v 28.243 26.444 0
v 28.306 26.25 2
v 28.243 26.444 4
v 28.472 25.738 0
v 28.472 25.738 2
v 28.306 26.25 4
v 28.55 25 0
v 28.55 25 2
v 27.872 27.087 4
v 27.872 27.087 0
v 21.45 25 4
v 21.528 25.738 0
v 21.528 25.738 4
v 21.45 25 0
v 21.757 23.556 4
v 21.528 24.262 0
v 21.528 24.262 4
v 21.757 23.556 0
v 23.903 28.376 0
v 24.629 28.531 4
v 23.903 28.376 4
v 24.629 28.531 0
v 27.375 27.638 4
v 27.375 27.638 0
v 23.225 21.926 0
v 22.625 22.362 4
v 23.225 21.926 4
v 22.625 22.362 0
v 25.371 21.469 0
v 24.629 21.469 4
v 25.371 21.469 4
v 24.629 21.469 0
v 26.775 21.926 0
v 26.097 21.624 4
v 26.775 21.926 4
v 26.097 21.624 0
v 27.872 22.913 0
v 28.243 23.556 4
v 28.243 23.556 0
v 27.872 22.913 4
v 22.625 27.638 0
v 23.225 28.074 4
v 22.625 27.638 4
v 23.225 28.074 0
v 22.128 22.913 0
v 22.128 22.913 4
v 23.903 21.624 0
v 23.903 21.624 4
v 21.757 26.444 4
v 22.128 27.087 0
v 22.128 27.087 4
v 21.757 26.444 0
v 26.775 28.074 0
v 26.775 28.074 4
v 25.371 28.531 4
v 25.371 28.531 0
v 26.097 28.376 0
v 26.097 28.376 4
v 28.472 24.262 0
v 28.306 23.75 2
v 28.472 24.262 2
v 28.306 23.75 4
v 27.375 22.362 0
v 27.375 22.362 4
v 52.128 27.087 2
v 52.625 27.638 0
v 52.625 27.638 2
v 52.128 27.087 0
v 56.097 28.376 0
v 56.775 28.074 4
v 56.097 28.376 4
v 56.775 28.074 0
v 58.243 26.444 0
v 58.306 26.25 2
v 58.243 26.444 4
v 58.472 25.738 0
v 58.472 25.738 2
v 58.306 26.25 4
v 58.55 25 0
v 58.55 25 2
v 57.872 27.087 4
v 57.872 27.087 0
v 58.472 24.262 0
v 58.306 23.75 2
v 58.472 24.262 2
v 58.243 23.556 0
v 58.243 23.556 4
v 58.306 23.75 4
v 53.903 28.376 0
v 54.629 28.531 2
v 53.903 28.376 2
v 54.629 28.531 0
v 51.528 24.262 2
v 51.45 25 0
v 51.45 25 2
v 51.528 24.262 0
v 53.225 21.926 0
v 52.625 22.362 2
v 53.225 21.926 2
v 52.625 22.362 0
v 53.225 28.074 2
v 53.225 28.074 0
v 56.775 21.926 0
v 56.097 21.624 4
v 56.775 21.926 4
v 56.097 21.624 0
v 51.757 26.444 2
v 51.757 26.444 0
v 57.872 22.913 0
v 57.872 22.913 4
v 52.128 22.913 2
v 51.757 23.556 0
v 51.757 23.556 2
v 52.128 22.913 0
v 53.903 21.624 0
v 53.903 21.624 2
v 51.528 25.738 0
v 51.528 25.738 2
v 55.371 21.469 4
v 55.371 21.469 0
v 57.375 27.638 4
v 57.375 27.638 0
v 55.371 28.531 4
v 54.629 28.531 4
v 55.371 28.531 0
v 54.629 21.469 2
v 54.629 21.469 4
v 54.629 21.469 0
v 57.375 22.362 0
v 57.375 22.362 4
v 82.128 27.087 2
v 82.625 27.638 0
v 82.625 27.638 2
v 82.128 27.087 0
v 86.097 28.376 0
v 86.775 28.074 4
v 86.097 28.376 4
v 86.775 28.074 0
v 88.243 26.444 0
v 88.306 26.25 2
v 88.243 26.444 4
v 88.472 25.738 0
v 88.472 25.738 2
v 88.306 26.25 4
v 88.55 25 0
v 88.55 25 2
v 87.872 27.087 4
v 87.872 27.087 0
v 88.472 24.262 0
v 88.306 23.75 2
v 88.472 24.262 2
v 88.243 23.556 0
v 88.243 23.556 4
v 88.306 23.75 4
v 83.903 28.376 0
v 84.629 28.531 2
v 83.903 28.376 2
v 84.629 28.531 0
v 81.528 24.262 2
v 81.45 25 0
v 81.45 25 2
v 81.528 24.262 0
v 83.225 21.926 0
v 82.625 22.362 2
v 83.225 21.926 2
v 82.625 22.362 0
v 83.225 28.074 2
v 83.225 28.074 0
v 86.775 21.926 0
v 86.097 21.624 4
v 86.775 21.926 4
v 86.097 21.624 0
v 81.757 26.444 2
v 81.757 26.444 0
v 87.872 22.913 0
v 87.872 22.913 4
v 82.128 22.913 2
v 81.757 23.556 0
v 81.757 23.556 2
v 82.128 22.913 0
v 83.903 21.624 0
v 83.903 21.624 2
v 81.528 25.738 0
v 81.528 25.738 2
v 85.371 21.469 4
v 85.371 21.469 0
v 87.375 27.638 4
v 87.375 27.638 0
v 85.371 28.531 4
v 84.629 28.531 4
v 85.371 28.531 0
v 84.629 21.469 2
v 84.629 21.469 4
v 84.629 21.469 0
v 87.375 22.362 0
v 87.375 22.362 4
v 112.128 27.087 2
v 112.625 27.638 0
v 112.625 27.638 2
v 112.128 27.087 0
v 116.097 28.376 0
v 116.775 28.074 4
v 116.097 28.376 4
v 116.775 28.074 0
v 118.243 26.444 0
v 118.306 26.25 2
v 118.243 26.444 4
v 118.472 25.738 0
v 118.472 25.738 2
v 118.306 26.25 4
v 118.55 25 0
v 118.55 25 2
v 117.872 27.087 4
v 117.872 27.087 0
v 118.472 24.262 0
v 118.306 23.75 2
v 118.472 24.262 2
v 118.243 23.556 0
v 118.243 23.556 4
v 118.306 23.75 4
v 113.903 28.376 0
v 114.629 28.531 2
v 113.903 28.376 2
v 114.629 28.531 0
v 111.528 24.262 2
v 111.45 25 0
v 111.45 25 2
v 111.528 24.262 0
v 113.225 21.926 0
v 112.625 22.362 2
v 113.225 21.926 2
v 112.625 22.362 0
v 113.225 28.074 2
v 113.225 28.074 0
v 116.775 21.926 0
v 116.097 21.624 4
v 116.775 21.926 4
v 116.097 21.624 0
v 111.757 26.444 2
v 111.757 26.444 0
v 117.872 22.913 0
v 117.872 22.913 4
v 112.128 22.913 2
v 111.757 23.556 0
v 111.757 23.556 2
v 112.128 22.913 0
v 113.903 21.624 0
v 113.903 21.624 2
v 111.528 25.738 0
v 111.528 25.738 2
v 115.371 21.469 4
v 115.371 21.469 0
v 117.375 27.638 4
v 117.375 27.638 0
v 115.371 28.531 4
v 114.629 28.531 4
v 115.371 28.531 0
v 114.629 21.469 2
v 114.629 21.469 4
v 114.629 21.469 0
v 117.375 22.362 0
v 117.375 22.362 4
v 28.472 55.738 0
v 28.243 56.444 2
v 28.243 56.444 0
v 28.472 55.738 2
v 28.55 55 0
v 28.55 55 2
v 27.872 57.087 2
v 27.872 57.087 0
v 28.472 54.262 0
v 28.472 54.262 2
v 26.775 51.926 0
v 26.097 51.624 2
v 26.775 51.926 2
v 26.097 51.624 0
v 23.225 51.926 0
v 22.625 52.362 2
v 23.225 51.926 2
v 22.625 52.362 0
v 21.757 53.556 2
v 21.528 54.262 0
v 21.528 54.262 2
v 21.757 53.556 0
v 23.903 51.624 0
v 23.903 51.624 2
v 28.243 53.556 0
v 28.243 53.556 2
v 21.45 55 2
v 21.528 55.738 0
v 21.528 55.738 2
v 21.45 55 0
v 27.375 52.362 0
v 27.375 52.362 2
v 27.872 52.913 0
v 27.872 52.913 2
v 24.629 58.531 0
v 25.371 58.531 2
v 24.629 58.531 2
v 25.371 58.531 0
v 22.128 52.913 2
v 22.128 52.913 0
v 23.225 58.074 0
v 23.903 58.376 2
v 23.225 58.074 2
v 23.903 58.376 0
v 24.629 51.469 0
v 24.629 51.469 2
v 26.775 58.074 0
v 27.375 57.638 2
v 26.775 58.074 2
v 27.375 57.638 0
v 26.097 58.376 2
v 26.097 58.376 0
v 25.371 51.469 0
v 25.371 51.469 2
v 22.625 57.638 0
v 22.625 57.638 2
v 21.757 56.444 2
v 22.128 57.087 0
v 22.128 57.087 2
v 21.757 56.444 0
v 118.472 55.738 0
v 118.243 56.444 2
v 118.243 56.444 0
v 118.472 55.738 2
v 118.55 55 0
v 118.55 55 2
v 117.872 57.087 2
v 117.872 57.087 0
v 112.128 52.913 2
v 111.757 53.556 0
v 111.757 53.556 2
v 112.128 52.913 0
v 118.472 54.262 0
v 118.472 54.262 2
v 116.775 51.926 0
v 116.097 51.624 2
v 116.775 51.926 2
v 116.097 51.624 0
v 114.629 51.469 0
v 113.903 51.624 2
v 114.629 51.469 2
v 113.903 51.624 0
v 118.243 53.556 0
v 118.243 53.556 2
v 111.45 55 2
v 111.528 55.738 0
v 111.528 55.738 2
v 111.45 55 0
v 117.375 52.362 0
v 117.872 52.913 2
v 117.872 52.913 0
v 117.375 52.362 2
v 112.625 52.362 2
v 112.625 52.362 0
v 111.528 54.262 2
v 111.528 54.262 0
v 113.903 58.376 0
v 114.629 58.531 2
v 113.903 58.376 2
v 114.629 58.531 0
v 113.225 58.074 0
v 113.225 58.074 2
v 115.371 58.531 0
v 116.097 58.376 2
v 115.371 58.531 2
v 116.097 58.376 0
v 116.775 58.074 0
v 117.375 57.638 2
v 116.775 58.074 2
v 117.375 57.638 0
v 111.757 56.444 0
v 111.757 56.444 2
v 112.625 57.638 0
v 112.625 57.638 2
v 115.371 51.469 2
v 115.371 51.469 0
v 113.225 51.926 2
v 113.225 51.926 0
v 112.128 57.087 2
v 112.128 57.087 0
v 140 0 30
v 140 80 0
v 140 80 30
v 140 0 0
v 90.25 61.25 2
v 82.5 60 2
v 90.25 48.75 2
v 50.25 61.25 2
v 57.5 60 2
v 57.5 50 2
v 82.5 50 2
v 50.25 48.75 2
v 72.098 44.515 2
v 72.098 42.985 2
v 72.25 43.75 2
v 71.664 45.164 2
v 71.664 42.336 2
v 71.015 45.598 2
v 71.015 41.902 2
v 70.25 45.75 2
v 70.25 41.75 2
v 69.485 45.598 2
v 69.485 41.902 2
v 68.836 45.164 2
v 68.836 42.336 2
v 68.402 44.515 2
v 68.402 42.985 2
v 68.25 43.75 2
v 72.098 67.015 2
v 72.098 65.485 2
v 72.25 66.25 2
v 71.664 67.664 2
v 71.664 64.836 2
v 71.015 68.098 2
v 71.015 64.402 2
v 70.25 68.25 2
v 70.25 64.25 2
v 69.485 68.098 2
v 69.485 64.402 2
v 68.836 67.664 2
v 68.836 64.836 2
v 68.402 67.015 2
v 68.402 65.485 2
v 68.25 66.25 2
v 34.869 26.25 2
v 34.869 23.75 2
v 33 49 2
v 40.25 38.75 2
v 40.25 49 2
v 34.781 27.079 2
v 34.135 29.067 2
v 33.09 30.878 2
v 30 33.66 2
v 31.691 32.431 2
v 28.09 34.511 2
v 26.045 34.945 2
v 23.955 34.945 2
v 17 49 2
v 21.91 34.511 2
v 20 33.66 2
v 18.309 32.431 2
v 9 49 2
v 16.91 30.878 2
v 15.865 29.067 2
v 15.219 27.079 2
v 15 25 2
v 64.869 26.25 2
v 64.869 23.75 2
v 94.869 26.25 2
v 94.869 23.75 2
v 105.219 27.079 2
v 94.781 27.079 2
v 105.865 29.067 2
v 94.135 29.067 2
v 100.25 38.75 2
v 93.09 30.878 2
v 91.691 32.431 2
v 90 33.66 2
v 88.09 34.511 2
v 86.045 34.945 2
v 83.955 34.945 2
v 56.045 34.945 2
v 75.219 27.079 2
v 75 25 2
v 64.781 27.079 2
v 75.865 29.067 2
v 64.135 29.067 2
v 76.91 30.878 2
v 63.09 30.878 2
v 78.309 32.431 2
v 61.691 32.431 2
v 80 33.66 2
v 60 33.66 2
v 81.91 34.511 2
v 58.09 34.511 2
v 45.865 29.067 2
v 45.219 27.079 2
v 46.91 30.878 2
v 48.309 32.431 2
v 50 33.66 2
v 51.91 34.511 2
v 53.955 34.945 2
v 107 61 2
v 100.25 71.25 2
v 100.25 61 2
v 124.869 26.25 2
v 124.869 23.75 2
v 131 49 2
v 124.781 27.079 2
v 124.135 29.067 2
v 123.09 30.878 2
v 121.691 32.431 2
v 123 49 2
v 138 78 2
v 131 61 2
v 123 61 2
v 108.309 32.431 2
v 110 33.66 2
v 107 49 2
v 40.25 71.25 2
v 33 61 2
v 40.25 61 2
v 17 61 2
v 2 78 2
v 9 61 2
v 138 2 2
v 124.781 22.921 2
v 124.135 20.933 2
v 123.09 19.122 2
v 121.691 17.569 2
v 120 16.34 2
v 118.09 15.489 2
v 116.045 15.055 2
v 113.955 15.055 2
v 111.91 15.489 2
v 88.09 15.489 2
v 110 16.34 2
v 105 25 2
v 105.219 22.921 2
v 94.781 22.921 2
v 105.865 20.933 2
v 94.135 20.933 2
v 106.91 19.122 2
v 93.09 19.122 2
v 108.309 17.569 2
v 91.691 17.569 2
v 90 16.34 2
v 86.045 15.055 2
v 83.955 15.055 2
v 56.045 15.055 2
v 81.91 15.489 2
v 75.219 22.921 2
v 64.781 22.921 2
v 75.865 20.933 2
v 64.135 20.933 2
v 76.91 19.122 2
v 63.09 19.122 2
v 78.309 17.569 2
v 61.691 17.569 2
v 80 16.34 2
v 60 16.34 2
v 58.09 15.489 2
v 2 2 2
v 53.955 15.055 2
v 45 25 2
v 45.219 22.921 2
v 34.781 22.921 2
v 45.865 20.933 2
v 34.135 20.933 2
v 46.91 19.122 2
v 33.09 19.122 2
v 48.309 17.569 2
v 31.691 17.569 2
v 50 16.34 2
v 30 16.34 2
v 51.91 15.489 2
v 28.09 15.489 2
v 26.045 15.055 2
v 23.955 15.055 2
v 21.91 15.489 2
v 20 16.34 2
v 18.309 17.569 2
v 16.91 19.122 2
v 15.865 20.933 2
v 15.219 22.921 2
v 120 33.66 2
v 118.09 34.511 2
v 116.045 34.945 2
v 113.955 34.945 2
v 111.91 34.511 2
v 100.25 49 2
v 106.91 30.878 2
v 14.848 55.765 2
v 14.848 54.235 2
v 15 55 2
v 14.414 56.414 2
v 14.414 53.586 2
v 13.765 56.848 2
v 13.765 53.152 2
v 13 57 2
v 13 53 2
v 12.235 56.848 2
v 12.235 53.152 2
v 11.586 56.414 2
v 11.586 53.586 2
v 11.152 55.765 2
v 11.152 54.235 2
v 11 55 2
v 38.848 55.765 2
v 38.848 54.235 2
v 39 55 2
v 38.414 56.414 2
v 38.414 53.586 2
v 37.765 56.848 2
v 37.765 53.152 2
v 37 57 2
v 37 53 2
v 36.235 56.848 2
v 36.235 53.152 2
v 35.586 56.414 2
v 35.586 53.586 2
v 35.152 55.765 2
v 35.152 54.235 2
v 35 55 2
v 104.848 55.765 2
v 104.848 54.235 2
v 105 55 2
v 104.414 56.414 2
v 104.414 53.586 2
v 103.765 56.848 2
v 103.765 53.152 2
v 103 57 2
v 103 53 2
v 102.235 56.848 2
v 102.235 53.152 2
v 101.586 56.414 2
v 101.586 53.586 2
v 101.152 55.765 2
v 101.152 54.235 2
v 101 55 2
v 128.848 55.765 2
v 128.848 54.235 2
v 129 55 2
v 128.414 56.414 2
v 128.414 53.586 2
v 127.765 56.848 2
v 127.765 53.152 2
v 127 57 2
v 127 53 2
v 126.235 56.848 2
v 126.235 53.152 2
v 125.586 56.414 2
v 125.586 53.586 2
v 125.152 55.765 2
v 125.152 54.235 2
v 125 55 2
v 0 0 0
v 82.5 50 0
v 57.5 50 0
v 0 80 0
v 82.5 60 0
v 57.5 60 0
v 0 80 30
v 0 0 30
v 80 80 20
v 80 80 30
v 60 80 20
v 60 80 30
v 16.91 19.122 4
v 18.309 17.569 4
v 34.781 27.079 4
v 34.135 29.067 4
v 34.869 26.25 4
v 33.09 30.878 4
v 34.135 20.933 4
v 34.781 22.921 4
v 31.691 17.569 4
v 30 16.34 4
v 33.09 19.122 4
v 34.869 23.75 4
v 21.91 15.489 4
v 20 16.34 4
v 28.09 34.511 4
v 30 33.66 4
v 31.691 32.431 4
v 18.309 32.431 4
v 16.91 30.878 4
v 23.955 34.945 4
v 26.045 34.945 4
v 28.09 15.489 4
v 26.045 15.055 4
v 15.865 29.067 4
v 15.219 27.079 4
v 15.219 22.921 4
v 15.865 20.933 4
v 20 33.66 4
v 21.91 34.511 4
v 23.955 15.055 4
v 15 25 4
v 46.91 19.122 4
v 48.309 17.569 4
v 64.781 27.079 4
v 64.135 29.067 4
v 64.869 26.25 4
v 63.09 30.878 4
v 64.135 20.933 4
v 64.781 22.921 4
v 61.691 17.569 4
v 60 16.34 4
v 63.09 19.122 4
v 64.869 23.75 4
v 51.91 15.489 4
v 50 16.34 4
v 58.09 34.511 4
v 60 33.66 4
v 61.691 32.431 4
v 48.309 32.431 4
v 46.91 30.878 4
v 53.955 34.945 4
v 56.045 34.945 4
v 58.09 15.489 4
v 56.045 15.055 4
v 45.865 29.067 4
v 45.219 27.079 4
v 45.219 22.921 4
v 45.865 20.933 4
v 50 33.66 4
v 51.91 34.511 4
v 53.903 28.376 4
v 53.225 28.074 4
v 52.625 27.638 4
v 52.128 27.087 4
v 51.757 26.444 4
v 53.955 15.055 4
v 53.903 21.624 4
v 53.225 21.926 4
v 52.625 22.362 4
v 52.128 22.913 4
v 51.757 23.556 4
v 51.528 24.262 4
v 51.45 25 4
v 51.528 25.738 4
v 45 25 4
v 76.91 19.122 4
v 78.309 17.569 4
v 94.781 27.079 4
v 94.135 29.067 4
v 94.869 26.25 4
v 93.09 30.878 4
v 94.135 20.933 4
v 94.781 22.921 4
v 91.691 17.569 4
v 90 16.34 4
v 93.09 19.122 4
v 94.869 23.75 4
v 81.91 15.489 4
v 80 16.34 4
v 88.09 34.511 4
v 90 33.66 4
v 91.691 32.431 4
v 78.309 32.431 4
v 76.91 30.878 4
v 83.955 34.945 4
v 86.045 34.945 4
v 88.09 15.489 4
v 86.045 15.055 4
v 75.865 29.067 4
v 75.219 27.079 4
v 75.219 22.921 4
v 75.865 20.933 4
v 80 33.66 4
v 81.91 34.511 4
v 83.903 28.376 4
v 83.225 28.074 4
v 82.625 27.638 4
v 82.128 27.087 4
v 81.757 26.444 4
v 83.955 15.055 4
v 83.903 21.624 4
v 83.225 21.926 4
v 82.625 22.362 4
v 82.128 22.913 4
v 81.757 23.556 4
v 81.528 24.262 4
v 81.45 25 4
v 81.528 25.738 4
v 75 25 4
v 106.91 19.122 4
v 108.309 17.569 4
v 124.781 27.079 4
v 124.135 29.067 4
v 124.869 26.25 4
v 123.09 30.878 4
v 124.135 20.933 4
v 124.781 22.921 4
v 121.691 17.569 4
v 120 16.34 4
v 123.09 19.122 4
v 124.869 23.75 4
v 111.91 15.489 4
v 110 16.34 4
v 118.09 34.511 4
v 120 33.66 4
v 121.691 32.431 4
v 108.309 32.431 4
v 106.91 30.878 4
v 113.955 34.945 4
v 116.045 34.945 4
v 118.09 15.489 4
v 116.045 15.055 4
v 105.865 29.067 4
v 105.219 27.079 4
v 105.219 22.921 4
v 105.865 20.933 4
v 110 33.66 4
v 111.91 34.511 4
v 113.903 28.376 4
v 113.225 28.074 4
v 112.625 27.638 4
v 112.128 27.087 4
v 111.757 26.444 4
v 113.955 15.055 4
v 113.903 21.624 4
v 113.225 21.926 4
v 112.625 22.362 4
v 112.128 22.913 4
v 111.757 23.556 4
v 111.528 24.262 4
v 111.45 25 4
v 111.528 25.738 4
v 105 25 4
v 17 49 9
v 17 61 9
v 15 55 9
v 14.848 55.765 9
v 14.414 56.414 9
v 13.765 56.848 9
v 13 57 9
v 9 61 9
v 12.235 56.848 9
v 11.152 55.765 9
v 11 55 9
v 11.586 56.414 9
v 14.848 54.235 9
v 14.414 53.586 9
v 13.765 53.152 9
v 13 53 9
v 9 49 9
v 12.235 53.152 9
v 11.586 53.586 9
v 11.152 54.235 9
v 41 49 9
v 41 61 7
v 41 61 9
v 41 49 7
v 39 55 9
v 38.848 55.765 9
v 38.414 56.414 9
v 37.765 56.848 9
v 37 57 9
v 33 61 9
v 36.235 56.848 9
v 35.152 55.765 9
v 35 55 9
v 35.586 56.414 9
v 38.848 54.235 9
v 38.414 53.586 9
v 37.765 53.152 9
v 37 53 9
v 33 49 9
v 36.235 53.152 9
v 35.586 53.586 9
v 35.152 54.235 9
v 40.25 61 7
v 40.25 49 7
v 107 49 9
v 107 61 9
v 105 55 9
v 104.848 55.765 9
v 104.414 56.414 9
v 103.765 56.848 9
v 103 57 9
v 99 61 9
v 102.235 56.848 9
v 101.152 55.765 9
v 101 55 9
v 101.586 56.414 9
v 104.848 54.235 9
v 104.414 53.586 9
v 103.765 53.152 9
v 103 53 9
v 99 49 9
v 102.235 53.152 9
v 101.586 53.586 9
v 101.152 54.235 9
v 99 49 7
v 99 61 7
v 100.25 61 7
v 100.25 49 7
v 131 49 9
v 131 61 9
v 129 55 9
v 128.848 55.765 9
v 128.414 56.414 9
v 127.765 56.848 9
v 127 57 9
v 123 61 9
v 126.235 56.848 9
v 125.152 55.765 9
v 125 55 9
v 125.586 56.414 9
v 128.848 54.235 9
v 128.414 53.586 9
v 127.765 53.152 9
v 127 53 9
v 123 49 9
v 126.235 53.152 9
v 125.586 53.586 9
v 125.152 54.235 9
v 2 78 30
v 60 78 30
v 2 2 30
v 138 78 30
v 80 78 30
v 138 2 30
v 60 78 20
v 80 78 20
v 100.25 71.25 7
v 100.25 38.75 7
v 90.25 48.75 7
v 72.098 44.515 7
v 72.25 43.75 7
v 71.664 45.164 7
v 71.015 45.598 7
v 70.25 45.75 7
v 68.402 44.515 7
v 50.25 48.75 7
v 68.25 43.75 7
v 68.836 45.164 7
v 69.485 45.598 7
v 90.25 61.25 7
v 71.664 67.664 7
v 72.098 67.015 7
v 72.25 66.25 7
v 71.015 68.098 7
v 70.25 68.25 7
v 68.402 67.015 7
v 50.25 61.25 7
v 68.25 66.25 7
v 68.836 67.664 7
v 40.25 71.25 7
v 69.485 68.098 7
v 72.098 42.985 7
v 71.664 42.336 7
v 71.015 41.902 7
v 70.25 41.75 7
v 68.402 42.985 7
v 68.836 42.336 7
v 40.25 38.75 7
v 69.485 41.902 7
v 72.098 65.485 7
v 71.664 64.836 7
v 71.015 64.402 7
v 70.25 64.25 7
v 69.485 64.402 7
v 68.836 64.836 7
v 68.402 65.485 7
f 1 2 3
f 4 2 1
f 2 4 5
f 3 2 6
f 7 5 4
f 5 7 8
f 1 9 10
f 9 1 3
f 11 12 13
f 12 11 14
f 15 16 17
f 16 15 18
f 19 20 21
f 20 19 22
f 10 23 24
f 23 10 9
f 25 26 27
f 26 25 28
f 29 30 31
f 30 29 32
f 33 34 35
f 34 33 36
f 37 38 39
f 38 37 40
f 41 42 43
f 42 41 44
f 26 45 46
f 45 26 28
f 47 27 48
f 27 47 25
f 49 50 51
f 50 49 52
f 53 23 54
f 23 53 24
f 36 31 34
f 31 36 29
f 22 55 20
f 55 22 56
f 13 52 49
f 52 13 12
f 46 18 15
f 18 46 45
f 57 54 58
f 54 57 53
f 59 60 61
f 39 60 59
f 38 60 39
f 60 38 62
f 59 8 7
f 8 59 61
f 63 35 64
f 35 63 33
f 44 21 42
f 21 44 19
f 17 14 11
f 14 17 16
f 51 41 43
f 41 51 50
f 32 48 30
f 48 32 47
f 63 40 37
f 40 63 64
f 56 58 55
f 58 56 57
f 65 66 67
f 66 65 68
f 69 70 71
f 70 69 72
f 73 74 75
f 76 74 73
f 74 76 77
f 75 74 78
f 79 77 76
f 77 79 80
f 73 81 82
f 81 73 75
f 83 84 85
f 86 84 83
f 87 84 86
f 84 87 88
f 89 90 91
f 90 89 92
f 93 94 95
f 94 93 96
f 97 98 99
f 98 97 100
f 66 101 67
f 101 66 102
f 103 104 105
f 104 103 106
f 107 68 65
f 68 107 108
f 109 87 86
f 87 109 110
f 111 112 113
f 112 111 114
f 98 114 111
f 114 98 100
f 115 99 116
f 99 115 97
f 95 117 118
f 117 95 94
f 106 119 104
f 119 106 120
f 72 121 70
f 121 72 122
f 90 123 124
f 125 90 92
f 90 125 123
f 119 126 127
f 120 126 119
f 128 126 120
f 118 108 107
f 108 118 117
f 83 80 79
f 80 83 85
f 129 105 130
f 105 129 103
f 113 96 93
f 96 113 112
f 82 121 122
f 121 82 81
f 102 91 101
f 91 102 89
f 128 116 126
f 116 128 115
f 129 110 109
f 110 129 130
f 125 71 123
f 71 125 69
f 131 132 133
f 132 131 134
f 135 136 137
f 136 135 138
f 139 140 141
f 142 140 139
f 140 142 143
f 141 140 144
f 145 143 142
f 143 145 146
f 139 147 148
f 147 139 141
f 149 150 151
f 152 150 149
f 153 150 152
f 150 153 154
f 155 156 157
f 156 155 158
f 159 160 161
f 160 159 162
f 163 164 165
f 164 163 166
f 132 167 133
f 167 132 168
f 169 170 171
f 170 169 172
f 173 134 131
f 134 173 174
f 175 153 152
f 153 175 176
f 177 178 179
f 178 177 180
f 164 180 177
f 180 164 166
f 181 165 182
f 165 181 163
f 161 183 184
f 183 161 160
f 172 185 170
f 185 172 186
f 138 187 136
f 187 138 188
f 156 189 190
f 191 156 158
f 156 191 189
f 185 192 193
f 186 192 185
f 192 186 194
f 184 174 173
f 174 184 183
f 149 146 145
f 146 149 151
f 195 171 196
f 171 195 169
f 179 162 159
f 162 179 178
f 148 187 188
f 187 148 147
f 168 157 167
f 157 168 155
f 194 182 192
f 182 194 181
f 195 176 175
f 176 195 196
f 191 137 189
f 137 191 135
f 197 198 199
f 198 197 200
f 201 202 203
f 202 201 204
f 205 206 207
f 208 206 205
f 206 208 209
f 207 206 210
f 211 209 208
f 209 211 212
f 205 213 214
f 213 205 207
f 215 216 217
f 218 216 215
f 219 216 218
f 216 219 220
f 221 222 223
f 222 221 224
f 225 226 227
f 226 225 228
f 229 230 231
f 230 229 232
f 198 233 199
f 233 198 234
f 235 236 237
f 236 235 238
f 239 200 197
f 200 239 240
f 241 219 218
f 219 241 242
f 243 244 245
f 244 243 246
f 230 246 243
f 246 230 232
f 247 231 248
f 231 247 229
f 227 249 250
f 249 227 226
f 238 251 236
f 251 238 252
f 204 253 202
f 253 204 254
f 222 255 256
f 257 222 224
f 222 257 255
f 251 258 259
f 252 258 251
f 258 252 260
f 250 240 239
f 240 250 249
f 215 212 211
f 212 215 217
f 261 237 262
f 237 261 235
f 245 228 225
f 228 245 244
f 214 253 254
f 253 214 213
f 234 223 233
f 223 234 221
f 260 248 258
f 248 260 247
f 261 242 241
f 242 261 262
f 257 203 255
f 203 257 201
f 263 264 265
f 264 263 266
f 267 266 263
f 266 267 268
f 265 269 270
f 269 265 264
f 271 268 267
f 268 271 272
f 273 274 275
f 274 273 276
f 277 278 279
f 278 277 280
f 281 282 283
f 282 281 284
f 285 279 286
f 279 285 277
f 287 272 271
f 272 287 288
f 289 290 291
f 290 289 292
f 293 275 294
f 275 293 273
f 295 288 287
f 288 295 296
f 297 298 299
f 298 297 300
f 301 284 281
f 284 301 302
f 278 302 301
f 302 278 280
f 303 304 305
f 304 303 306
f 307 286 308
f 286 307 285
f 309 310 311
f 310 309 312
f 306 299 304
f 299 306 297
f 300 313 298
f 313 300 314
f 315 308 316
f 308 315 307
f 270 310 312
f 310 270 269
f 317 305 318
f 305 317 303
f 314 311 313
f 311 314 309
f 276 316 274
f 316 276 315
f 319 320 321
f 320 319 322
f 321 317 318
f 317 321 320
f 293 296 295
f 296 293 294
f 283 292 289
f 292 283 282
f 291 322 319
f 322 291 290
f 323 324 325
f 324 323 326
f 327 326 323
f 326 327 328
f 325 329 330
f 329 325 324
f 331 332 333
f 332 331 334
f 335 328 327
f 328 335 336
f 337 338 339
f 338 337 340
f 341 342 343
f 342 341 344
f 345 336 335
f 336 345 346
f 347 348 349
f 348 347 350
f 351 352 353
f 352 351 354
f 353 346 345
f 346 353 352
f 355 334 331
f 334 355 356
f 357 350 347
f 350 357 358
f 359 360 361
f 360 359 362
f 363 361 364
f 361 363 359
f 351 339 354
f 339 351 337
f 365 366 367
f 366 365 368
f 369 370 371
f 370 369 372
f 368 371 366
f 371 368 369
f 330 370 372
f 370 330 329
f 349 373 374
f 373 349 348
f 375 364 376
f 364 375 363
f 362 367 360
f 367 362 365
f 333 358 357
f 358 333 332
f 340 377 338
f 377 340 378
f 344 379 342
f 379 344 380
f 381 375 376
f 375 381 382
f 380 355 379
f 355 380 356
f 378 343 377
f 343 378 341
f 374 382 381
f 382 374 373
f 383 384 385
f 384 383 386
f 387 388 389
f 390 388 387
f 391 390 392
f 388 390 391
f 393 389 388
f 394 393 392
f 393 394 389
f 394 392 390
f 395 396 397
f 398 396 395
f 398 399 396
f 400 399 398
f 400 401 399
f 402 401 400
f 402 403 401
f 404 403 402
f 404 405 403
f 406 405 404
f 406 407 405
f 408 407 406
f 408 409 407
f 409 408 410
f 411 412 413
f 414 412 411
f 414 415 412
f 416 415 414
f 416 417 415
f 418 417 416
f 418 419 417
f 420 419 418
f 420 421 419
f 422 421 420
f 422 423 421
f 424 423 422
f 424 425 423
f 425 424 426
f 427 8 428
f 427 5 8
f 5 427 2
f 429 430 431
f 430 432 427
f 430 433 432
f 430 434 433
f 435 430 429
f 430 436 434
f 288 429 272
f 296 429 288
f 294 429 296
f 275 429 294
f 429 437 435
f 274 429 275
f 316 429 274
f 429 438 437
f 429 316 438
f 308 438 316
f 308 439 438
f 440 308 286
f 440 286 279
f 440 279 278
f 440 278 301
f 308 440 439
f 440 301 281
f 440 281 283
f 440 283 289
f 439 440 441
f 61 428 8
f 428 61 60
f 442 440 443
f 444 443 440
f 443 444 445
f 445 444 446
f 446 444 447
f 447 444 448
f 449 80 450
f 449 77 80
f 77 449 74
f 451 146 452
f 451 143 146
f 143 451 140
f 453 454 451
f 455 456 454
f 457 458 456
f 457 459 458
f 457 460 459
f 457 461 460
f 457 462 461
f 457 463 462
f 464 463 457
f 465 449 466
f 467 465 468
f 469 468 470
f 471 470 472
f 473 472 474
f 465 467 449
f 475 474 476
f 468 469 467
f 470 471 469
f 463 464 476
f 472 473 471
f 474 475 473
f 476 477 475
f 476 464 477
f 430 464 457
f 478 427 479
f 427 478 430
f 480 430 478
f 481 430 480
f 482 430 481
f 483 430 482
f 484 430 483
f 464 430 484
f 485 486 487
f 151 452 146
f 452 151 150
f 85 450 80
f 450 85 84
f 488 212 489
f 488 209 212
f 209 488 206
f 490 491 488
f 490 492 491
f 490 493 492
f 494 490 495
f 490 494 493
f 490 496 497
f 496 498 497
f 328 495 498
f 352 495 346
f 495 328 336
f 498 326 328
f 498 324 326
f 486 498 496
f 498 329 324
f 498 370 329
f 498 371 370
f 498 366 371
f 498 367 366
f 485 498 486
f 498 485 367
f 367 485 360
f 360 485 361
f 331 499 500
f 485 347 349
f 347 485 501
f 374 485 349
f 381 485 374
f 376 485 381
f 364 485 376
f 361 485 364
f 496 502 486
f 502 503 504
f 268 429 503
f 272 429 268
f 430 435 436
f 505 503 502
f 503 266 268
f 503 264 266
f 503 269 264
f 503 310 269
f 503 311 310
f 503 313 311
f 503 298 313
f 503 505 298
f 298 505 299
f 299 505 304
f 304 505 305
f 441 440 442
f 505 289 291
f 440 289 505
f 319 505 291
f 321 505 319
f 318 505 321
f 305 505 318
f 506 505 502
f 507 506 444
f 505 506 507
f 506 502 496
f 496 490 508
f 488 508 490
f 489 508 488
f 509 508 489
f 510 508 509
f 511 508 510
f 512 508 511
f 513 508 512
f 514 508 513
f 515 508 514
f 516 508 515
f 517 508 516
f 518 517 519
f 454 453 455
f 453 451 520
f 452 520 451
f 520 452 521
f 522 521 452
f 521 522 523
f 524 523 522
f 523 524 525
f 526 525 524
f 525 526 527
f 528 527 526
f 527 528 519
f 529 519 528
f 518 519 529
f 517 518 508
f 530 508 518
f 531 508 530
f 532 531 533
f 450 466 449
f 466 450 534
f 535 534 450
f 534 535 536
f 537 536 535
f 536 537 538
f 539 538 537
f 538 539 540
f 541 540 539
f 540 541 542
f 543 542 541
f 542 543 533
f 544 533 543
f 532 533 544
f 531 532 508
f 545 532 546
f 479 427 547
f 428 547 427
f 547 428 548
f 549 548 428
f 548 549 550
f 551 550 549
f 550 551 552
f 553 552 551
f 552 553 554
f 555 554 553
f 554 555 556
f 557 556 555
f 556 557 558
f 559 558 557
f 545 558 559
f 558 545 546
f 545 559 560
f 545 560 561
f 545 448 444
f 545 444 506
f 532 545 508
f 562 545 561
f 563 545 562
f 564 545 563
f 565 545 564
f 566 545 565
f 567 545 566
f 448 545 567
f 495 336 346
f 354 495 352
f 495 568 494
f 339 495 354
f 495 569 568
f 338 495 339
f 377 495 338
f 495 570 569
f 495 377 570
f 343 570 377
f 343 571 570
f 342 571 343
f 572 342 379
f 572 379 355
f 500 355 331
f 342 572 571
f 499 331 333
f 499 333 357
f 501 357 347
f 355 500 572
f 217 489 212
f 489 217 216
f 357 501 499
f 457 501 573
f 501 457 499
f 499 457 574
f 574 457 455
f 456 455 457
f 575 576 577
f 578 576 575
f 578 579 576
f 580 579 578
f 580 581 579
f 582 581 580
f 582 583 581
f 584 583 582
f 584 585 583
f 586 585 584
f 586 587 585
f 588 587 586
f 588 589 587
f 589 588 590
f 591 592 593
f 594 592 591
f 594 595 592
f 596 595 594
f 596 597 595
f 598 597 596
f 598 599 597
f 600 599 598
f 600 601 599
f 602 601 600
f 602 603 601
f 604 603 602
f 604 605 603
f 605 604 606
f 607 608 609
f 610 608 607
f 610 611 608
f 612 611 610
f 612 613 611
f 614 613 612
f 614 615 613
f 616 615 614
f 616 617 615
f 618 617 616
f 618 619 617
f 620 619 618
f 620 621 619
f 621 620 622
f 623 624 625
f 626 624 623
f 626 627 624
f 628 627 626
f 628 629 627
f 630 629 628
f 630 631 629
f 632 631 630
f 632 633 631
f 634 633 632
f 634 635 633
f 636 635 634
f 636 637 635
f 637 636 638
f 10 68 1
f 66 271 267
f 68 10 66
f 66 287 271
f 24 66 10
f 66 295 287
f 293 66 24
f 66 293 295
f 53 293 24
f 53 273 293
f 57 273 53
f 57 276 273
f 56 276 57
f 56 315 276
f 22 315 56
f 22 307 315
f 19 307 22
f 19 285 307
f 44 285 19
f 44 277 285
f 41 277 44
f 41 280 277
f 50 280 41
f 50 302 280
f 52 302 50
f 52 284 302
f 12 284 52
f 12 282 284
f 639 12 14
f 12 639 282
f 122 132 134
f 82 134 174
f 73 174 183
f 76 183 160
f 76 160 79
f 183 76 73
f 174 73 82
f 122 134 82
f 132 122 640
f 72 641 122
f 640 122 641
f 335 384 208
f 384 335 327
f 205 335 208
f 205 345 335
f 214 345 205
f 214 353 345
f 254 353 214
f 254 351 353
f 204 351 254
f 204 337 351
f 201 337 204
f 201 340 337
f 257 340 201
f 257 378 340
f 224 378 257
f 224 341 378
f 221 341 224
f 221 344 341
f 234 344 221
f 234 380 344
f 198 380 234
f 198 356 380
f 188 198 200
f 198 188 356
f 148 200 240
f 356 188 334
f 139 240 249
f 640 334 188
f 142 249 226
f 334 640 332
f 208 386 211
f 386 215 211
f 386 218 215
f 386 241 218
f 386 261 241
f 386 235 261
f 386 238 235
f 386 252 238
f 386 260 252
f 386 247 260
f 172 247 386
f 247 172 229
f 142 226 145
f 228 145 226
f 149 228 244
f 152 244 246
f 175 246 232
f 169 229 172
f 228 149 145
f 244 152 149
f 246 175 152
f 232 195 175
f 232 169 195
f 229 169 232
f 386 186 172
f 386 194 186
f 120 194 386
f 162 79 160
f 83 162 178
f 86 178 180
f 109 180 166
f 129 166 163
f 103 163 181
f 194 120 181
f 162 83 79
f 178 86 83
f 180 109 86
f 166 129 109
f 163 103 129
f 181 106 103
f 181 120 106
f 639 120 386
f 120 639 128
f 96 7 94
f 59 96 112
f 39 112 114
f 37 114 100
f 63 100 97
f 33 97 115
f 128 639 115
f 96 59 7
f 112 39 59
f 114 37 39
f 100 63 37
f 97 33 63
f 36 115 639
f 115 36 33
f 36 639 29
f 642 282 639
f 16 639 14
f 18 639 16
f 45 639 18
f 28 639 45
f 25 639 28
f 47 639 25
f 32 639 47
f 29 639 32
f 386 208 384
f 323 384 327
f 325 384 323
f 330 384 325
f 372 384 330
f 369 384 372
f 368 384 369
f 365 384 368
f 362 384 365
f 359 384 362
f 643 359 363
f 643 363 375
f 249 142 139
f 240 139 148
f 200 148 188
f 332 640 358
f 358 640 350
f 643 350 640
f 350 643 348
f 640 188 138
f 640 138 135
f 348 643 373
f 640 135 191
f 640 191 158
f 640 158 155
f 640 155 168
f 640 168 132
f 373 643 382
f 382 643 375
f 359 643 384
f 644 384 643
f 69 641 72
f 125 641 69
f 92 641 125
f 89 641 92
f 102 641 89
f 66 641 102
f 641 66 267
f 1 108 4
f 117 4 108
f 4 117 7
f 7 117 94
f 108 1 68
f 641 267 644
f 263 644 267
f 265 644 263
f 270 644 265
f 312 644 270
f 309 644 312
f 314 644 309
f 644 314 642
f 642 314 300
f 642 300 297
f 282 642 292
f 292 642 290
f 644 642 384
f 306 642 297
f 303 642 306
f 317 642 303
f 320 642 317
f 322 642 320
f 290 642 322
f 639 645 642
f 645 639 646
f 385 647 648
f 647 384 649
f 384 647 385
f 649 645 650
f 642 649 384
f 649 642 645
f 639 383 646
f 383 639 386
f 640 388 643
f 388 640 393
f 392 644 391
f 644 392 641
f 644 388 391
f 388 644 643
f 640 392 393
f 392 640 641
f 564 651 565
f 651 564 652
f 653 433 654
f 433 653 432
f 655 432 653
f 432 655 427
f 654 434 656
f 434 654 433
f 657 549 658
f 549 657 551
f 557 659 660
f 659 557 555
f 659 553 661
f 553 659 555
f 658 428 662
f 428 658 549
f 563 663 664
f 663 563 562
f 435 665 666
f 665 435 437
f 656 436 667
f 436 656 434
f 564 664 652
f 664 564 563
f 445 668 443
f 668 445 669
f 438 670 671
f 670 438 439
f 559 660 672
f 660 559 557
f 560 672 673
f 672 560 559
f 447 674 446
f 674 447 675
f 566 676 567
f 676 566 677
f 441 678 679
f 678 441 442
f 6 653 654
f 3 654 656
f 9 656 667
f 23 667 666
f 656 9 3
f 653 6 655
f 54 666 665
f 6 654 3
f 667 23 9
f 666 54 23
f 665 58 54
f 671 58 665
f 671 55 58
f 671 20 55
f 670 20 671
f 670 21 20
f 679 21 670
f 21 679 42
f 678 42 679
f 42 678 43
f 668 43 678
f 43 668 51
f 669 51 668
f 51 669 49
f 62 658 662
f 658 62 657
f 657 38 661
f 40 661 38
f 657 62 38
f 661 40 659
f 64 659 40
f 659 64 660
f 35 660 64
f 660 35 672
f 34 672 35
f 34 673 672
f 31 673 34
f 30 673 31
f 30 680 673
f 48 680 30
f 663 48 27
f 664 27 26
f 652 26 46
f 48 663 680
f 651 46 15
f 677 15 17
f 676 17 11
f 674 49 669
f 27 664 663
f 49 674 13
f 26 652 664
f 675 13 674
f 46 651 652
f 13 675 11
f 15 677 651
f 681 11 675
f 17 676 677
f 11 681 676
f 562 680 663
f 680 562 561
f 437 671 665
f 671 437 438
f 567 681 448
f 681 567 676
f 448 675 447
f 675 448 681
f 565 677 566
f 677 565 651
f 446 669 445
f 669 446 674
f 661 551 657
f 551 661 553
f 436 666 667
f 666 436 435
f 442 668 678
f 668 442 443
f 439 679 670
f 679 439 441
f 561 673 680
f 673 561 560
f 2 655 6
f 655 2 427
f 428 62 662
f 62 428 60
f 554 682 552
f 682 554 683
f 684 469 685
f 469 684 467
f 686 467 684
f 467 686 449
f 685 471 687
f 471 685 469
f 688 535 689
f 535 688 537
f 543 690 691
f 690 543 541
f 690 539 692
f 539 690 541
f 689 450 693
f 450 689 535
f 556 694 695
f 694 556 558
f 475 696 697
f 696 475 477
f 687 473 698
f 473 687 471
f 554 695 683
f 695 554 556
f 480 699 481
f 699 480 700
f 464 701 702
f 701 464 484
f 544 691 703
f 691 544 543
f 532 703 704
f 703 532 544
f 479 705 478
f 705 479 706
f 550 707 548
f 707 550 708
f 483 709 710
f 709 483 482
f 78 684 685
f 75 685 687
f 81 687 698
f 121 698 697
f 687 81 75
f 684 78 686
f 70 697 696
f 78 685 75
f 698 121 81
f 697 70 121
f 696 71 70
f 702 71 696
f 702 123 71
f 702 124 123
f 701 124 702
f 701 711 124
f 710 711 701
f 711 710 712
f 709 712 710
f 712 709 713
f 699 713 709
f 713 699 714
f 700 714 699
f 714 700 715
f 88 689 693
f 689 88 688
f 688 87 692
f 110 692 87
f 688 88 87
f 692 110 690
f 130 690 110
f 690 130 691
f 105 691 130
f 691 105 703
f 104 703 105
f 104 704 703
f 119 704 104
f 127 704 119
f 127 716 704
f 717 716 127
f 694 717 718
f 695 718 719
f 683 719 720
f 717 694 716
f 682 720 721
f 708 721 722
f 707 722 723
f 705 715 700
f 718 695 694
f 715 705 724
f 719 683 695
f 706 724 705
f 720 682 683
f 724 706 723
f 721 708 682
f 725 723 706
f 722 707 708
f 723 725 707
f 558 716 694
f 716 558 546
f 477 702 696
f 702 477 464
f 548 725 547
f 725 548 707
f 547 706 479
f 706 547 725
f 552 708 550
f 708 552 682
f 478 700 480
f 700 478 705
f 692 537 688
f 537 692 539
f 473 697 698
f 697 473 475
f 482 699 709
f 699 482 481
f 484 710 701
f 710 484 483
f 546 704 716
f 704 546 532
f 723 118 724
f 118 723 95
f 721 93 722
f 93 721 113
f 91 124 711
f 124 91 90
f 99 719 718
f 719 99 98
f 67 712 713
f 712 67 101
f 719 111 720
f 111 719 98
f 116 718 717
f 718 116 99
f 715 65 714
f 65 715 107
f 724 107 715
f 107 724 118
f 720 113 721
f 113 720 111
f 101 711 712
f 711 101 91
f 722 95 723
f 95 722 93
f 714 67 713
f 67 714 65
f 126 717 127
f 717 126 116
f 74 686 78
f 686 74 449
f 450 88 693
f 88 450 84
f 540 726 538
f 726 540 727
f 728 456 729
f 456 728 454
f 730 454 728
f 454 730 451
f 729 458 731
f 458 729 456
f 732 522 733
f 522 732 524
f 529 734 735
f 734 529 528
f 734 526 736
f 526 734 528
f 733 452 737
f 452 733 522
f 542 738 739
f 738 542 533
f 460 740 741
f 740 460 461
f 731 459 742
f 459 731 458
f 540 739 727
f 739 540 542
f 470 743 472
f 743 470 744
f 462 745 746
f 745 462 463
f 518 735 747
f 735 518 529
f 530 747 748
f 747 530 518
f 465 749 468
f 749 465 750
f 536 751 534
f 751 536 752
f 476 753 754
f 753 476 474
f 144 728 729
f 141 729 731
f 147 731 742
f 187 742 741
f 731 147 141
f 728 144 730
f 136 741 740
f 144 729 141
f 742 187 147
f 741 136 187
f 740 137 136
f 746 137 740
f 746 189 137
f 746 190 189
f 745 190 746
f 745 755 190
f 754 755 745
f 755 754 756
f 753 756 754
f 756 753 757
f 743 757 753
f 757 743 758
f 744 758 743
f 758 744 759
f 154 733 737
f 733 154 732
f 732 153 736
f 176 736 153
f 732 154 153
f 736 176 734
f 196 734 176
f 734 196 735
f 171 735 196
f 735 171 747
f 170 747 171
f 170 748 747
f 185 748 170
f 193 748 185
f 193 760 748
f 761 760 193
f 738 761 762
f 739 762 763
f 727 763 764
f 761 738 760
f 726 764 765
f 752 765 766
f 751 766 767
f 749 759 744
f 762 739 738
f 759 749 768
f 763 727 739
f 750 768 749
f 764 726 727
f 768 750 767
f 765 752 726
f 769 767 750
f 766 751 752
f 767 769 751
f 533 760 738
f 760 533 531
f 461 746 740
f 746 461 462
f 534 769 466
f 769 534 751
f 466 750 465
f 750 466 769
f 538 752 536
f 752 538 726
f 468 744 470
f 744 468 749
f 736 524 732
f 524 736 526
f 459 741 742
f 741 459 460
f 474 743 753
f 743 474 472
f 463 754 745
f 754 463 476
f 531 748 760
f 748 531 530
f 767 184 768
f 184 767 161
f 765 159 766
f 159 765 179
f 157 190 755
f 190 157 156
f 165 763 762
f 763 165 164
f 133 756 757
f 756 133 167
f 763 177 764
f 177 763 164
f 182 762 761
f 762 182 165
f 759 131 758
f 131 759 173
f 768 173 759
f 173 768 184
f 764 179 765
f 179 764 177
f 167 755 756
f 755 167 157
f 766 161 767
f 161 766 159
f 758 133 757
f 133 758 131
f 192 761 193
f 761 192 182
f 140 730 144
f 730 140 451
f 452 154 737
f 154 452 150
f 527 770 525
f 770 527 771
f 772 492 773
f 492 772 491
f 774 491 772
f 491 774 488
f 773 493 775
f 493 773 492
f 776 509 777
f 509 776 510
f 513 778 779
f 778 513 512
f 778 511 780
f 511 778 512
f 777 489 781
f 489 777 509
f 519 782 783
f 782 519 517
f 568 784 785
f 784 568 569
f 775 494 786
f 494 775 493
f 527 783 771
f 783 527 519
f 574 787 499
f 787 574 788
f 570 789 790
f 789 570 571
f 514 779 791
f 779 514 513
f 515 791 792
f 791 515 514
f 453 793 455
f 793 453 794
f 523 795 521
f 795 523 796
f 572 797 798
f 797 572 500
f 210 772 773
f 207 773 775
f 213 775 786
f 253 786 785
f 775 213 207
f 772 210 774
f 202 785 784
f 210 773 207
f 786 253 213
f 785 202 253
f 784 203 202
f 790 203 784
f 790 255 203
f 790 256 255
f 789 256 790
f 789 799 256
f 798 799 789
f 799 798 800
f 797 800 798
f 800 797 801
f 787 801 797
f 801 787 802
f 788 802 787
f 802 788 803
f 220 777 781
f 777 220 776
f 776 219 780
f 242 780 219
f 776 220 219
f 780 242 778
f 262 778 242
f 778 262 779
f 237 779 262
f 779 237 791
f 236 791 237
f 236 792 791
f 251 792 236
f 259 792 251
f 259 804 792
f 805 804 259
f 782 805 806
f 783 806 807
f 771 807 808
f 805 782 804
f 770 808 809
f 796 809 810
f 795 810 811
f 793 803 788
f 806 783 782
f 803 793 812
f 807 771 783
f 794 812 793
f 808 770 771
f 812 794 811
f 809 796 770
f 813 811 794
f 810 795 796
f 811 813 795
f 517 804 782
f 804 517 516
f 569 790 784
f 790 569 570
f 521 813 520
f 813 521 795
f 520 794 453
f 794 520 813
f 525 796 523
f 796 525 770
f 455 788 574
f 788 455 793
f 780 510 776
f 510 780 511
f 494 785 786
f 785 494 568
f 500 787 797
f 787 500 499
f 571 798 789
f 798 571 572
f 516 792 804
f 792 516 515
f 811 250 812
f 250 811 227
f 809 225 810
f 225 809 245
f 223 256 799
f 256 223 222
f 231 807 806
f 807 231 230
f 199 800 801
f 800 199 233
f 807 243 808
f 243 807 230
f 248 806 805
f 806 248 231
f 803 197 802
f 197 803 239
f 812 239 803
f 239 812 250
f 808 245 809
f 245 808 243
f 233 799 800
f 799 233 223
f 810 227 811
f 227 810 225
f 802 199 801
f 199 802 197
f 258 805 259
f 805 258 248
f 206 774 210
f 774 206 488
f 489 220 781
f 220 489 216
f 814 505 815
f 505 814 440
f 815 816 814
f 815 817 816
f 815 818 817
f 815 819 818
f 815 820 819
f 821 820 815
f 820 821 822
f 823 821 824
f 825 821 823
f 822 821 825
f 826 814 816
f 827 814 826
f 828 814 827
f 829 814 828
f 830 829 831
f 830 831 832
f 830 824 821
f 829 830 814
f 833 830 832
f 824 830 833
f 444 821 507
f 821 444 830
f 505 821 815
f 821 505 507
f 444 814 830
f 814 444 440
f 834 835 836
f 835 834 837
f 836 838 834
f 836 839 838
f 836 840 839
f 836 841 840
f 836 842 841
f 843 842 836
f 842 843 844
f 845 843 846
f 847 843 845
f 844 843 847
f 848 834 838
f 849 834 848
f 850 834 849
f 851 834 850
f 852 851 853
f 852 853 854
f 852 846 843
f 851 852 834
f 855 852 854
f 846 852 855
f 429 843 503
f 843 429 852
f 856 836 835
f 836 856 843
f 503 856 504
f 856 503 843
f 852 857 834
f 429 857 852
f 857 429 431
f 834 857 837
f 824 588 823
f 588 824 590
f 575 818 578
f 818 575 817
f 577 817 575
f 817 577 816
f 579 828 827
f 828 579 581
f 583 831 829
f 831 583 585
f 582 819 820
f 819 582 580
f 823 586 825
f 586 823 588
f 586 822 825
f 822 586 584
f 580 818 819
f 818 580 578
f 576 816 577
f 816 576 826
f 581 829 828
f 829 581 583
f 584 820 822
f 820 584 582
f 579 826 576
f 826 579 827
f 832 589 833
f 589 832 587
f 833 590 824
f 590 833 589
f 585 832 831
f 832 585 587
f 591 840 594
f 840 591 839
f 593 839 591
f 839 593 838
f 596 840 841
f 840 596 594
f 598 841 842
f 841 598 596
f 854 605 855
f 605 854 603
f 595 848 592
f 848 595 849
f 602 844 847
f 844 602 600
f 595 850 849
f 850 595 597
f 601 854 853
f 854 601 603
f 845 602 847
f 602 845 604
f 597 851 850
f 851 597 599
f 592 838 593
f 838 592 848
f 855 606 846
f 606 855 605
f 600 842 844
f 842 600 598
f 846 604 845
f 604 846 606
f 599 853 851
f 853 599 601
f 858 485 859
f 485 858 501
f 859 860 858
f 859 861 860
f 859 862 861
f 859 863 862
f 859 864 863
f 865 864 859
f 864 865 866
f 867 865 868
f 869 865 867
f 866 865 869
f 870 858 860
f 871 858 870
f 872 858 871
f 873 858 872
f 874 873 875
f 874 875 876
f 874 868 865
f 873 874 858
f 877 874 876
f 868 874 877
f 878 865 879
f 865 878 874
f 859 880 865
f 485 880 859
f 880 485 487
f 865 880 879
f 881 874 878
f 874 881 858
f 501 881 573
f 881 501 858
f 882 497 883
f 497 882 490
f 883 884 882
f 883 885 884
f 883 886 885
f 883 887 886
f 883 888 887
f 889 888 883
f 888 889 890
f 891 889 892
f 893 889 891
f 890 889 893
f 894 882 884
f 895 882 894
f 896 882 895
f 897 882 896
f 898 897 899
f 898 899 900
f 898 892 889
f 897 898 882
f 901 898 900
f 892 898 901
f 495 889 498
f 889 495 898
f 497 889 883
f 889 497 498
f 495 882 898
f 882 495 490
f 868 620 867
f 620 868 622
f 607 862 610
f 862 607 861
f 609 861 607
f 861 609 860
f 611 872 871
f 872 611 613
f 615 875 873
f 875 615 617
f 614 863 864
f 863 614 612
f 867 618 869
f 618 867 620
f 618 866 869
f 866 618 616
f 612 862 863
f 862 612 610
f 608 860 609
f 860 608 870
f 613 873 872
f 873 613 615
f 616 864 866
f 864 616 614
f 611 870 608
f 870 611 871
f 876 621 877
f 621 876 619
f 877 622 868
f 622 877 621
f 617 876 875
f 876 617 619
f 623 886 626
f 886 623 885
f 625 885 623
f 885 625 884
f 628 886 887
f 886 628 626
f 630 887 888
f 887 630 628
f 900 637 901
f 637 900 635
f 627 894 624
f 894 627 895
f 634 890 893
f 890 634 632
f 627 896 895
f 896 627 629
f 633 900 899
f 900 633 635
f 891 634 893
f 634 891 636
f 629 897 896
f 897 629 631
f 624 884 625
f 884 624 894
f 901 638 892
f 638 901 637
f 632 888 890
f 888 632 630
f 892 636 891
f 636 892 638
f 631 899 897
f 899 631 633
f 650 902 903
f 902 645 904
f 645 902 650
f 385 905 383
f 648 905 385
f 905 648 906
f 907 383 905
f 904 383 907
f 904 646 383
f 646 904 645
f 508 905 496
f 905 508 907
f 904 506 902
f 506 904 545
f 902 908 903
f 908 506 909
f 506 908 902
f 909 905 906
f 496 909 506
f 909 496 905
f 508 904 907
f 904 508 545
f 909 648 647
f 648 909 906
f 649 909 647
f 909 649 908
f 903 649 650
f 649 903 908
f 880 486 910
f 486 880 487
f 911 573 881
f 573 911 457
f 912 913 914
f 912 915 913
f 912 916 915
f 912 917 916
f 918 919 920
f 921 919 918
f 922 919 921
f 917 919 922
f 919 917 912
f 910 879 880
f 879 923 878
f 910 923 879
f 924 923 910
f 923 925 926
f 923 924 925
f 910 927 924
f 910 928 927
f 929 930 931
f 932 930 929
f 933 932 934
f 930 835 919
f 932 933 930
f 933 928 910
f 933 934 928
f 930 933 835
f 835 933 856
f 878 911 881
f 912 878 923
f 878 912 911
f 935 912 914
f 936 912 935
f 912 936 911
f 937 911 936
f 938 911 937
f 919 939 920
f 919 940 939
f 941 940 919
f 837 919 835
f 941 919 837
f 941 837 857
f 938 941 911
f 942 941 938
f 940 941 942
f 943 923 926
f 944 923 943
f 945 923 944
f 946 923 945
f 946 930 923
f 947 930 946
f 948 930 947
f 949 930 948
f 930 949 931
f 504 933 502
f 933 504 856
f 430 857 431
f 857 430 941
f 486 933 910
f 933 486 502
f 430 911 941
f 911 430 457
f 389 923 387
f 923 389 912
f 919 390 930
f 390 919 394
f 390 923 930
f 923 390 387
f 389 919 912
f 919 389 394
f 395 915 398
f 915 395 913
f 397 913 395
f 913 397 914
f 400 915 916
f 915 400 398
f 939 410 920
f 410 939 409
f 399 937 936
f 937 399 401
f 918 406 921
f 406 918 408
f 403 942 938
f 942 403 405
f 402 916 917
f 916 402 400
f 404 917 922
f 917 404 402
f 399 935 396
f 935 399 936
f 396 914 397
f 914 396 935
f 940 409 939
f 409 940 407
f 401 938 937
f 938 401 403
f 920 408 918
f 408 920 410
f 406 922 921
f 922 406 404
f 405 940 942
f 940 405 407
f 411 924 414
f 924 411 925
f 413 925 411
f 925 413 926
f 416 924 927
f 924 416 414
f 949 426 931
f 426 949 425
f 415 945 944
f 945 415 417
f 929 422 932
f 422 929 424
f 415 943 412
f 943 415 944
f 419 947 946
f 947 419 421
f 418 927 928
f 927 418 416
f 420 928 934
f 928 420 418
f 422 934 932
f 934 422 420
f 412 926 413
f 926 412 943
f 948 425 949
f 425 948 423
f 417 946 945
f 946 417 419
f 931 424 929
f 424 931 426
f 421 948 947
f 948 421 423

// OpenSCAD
tolerance = 0.2;
shaft_diameter = 7 + tolerance;

module shaft_hole() {
  cylinder(d=7.1, h=12, $fn=30);
}

module shaft_mount() {
  difference() {
    cylinder(d=20,h=2);
    translate([0,0,-1]) shaft_hole();
    translate([2,-1.25,-1]) cube([10, 2.5, 12]);
  }
}

module rotary_mount() {
  difference() {   
    translate([-16,-6,0]) {
      cube([8,12,9]);
      translate([24,0,0]) cube([8,12,9]);
    }
    
    translate([-12,0,-1]) cylinder(d=4,h=12,$fn=16);
    translate([12,0,-1]) cylinder(d=4,h=12,$fn=16);
  }
}

// Front plate
difference() {
cube([140,80,2]);

// OLED hole
translate([115/2, 50, -1]) cube([25,10,4]);

translate([25,25,0]) {
translate([0,0,-1]) shaft_hole();
translate([30,0,-1]) shaft_hole();
translate([60,0,-1]) shaft_hole();
translate([90,0,-1]) shaft_hole();

translate([0,30,-1]) shaft_hole();
translate([90,30,-1]) shaft_hole();

};
}

// Potentiometer mounts
translate([25,25,2]) {
  shaft_mount();
  translate([30,0,0]) shaft_mount();
  translate([60,0,0]) shaft_mount();
  translate([90,0,0]) shaft_mount();  
}

// Rotary encoder mounts
translate([25,55,0]) rotary_mount();
translate([115,55,0]) rotary_mount();

// Shell / sides
difference() {
    cube([140,80,30]);
    translate([2,2,-1]) cube([136,76,32]);
    translate([60,77,20]) cube([20,4,11]);
}

// OLED Frame
translate([115/2 - 17 - .25, 55 - 16.25, 2])
difference() {
  cube([60, 32.5, 5]);
  translate([10,10,-1]) cube([40, 12.5, 10]);
  translate([30,5,-1]) cylinder(d=4, h=20, $fn=16);
  translate([30,27.5,-1]) cylinder(d=4, h=20, $fn=16);
}
